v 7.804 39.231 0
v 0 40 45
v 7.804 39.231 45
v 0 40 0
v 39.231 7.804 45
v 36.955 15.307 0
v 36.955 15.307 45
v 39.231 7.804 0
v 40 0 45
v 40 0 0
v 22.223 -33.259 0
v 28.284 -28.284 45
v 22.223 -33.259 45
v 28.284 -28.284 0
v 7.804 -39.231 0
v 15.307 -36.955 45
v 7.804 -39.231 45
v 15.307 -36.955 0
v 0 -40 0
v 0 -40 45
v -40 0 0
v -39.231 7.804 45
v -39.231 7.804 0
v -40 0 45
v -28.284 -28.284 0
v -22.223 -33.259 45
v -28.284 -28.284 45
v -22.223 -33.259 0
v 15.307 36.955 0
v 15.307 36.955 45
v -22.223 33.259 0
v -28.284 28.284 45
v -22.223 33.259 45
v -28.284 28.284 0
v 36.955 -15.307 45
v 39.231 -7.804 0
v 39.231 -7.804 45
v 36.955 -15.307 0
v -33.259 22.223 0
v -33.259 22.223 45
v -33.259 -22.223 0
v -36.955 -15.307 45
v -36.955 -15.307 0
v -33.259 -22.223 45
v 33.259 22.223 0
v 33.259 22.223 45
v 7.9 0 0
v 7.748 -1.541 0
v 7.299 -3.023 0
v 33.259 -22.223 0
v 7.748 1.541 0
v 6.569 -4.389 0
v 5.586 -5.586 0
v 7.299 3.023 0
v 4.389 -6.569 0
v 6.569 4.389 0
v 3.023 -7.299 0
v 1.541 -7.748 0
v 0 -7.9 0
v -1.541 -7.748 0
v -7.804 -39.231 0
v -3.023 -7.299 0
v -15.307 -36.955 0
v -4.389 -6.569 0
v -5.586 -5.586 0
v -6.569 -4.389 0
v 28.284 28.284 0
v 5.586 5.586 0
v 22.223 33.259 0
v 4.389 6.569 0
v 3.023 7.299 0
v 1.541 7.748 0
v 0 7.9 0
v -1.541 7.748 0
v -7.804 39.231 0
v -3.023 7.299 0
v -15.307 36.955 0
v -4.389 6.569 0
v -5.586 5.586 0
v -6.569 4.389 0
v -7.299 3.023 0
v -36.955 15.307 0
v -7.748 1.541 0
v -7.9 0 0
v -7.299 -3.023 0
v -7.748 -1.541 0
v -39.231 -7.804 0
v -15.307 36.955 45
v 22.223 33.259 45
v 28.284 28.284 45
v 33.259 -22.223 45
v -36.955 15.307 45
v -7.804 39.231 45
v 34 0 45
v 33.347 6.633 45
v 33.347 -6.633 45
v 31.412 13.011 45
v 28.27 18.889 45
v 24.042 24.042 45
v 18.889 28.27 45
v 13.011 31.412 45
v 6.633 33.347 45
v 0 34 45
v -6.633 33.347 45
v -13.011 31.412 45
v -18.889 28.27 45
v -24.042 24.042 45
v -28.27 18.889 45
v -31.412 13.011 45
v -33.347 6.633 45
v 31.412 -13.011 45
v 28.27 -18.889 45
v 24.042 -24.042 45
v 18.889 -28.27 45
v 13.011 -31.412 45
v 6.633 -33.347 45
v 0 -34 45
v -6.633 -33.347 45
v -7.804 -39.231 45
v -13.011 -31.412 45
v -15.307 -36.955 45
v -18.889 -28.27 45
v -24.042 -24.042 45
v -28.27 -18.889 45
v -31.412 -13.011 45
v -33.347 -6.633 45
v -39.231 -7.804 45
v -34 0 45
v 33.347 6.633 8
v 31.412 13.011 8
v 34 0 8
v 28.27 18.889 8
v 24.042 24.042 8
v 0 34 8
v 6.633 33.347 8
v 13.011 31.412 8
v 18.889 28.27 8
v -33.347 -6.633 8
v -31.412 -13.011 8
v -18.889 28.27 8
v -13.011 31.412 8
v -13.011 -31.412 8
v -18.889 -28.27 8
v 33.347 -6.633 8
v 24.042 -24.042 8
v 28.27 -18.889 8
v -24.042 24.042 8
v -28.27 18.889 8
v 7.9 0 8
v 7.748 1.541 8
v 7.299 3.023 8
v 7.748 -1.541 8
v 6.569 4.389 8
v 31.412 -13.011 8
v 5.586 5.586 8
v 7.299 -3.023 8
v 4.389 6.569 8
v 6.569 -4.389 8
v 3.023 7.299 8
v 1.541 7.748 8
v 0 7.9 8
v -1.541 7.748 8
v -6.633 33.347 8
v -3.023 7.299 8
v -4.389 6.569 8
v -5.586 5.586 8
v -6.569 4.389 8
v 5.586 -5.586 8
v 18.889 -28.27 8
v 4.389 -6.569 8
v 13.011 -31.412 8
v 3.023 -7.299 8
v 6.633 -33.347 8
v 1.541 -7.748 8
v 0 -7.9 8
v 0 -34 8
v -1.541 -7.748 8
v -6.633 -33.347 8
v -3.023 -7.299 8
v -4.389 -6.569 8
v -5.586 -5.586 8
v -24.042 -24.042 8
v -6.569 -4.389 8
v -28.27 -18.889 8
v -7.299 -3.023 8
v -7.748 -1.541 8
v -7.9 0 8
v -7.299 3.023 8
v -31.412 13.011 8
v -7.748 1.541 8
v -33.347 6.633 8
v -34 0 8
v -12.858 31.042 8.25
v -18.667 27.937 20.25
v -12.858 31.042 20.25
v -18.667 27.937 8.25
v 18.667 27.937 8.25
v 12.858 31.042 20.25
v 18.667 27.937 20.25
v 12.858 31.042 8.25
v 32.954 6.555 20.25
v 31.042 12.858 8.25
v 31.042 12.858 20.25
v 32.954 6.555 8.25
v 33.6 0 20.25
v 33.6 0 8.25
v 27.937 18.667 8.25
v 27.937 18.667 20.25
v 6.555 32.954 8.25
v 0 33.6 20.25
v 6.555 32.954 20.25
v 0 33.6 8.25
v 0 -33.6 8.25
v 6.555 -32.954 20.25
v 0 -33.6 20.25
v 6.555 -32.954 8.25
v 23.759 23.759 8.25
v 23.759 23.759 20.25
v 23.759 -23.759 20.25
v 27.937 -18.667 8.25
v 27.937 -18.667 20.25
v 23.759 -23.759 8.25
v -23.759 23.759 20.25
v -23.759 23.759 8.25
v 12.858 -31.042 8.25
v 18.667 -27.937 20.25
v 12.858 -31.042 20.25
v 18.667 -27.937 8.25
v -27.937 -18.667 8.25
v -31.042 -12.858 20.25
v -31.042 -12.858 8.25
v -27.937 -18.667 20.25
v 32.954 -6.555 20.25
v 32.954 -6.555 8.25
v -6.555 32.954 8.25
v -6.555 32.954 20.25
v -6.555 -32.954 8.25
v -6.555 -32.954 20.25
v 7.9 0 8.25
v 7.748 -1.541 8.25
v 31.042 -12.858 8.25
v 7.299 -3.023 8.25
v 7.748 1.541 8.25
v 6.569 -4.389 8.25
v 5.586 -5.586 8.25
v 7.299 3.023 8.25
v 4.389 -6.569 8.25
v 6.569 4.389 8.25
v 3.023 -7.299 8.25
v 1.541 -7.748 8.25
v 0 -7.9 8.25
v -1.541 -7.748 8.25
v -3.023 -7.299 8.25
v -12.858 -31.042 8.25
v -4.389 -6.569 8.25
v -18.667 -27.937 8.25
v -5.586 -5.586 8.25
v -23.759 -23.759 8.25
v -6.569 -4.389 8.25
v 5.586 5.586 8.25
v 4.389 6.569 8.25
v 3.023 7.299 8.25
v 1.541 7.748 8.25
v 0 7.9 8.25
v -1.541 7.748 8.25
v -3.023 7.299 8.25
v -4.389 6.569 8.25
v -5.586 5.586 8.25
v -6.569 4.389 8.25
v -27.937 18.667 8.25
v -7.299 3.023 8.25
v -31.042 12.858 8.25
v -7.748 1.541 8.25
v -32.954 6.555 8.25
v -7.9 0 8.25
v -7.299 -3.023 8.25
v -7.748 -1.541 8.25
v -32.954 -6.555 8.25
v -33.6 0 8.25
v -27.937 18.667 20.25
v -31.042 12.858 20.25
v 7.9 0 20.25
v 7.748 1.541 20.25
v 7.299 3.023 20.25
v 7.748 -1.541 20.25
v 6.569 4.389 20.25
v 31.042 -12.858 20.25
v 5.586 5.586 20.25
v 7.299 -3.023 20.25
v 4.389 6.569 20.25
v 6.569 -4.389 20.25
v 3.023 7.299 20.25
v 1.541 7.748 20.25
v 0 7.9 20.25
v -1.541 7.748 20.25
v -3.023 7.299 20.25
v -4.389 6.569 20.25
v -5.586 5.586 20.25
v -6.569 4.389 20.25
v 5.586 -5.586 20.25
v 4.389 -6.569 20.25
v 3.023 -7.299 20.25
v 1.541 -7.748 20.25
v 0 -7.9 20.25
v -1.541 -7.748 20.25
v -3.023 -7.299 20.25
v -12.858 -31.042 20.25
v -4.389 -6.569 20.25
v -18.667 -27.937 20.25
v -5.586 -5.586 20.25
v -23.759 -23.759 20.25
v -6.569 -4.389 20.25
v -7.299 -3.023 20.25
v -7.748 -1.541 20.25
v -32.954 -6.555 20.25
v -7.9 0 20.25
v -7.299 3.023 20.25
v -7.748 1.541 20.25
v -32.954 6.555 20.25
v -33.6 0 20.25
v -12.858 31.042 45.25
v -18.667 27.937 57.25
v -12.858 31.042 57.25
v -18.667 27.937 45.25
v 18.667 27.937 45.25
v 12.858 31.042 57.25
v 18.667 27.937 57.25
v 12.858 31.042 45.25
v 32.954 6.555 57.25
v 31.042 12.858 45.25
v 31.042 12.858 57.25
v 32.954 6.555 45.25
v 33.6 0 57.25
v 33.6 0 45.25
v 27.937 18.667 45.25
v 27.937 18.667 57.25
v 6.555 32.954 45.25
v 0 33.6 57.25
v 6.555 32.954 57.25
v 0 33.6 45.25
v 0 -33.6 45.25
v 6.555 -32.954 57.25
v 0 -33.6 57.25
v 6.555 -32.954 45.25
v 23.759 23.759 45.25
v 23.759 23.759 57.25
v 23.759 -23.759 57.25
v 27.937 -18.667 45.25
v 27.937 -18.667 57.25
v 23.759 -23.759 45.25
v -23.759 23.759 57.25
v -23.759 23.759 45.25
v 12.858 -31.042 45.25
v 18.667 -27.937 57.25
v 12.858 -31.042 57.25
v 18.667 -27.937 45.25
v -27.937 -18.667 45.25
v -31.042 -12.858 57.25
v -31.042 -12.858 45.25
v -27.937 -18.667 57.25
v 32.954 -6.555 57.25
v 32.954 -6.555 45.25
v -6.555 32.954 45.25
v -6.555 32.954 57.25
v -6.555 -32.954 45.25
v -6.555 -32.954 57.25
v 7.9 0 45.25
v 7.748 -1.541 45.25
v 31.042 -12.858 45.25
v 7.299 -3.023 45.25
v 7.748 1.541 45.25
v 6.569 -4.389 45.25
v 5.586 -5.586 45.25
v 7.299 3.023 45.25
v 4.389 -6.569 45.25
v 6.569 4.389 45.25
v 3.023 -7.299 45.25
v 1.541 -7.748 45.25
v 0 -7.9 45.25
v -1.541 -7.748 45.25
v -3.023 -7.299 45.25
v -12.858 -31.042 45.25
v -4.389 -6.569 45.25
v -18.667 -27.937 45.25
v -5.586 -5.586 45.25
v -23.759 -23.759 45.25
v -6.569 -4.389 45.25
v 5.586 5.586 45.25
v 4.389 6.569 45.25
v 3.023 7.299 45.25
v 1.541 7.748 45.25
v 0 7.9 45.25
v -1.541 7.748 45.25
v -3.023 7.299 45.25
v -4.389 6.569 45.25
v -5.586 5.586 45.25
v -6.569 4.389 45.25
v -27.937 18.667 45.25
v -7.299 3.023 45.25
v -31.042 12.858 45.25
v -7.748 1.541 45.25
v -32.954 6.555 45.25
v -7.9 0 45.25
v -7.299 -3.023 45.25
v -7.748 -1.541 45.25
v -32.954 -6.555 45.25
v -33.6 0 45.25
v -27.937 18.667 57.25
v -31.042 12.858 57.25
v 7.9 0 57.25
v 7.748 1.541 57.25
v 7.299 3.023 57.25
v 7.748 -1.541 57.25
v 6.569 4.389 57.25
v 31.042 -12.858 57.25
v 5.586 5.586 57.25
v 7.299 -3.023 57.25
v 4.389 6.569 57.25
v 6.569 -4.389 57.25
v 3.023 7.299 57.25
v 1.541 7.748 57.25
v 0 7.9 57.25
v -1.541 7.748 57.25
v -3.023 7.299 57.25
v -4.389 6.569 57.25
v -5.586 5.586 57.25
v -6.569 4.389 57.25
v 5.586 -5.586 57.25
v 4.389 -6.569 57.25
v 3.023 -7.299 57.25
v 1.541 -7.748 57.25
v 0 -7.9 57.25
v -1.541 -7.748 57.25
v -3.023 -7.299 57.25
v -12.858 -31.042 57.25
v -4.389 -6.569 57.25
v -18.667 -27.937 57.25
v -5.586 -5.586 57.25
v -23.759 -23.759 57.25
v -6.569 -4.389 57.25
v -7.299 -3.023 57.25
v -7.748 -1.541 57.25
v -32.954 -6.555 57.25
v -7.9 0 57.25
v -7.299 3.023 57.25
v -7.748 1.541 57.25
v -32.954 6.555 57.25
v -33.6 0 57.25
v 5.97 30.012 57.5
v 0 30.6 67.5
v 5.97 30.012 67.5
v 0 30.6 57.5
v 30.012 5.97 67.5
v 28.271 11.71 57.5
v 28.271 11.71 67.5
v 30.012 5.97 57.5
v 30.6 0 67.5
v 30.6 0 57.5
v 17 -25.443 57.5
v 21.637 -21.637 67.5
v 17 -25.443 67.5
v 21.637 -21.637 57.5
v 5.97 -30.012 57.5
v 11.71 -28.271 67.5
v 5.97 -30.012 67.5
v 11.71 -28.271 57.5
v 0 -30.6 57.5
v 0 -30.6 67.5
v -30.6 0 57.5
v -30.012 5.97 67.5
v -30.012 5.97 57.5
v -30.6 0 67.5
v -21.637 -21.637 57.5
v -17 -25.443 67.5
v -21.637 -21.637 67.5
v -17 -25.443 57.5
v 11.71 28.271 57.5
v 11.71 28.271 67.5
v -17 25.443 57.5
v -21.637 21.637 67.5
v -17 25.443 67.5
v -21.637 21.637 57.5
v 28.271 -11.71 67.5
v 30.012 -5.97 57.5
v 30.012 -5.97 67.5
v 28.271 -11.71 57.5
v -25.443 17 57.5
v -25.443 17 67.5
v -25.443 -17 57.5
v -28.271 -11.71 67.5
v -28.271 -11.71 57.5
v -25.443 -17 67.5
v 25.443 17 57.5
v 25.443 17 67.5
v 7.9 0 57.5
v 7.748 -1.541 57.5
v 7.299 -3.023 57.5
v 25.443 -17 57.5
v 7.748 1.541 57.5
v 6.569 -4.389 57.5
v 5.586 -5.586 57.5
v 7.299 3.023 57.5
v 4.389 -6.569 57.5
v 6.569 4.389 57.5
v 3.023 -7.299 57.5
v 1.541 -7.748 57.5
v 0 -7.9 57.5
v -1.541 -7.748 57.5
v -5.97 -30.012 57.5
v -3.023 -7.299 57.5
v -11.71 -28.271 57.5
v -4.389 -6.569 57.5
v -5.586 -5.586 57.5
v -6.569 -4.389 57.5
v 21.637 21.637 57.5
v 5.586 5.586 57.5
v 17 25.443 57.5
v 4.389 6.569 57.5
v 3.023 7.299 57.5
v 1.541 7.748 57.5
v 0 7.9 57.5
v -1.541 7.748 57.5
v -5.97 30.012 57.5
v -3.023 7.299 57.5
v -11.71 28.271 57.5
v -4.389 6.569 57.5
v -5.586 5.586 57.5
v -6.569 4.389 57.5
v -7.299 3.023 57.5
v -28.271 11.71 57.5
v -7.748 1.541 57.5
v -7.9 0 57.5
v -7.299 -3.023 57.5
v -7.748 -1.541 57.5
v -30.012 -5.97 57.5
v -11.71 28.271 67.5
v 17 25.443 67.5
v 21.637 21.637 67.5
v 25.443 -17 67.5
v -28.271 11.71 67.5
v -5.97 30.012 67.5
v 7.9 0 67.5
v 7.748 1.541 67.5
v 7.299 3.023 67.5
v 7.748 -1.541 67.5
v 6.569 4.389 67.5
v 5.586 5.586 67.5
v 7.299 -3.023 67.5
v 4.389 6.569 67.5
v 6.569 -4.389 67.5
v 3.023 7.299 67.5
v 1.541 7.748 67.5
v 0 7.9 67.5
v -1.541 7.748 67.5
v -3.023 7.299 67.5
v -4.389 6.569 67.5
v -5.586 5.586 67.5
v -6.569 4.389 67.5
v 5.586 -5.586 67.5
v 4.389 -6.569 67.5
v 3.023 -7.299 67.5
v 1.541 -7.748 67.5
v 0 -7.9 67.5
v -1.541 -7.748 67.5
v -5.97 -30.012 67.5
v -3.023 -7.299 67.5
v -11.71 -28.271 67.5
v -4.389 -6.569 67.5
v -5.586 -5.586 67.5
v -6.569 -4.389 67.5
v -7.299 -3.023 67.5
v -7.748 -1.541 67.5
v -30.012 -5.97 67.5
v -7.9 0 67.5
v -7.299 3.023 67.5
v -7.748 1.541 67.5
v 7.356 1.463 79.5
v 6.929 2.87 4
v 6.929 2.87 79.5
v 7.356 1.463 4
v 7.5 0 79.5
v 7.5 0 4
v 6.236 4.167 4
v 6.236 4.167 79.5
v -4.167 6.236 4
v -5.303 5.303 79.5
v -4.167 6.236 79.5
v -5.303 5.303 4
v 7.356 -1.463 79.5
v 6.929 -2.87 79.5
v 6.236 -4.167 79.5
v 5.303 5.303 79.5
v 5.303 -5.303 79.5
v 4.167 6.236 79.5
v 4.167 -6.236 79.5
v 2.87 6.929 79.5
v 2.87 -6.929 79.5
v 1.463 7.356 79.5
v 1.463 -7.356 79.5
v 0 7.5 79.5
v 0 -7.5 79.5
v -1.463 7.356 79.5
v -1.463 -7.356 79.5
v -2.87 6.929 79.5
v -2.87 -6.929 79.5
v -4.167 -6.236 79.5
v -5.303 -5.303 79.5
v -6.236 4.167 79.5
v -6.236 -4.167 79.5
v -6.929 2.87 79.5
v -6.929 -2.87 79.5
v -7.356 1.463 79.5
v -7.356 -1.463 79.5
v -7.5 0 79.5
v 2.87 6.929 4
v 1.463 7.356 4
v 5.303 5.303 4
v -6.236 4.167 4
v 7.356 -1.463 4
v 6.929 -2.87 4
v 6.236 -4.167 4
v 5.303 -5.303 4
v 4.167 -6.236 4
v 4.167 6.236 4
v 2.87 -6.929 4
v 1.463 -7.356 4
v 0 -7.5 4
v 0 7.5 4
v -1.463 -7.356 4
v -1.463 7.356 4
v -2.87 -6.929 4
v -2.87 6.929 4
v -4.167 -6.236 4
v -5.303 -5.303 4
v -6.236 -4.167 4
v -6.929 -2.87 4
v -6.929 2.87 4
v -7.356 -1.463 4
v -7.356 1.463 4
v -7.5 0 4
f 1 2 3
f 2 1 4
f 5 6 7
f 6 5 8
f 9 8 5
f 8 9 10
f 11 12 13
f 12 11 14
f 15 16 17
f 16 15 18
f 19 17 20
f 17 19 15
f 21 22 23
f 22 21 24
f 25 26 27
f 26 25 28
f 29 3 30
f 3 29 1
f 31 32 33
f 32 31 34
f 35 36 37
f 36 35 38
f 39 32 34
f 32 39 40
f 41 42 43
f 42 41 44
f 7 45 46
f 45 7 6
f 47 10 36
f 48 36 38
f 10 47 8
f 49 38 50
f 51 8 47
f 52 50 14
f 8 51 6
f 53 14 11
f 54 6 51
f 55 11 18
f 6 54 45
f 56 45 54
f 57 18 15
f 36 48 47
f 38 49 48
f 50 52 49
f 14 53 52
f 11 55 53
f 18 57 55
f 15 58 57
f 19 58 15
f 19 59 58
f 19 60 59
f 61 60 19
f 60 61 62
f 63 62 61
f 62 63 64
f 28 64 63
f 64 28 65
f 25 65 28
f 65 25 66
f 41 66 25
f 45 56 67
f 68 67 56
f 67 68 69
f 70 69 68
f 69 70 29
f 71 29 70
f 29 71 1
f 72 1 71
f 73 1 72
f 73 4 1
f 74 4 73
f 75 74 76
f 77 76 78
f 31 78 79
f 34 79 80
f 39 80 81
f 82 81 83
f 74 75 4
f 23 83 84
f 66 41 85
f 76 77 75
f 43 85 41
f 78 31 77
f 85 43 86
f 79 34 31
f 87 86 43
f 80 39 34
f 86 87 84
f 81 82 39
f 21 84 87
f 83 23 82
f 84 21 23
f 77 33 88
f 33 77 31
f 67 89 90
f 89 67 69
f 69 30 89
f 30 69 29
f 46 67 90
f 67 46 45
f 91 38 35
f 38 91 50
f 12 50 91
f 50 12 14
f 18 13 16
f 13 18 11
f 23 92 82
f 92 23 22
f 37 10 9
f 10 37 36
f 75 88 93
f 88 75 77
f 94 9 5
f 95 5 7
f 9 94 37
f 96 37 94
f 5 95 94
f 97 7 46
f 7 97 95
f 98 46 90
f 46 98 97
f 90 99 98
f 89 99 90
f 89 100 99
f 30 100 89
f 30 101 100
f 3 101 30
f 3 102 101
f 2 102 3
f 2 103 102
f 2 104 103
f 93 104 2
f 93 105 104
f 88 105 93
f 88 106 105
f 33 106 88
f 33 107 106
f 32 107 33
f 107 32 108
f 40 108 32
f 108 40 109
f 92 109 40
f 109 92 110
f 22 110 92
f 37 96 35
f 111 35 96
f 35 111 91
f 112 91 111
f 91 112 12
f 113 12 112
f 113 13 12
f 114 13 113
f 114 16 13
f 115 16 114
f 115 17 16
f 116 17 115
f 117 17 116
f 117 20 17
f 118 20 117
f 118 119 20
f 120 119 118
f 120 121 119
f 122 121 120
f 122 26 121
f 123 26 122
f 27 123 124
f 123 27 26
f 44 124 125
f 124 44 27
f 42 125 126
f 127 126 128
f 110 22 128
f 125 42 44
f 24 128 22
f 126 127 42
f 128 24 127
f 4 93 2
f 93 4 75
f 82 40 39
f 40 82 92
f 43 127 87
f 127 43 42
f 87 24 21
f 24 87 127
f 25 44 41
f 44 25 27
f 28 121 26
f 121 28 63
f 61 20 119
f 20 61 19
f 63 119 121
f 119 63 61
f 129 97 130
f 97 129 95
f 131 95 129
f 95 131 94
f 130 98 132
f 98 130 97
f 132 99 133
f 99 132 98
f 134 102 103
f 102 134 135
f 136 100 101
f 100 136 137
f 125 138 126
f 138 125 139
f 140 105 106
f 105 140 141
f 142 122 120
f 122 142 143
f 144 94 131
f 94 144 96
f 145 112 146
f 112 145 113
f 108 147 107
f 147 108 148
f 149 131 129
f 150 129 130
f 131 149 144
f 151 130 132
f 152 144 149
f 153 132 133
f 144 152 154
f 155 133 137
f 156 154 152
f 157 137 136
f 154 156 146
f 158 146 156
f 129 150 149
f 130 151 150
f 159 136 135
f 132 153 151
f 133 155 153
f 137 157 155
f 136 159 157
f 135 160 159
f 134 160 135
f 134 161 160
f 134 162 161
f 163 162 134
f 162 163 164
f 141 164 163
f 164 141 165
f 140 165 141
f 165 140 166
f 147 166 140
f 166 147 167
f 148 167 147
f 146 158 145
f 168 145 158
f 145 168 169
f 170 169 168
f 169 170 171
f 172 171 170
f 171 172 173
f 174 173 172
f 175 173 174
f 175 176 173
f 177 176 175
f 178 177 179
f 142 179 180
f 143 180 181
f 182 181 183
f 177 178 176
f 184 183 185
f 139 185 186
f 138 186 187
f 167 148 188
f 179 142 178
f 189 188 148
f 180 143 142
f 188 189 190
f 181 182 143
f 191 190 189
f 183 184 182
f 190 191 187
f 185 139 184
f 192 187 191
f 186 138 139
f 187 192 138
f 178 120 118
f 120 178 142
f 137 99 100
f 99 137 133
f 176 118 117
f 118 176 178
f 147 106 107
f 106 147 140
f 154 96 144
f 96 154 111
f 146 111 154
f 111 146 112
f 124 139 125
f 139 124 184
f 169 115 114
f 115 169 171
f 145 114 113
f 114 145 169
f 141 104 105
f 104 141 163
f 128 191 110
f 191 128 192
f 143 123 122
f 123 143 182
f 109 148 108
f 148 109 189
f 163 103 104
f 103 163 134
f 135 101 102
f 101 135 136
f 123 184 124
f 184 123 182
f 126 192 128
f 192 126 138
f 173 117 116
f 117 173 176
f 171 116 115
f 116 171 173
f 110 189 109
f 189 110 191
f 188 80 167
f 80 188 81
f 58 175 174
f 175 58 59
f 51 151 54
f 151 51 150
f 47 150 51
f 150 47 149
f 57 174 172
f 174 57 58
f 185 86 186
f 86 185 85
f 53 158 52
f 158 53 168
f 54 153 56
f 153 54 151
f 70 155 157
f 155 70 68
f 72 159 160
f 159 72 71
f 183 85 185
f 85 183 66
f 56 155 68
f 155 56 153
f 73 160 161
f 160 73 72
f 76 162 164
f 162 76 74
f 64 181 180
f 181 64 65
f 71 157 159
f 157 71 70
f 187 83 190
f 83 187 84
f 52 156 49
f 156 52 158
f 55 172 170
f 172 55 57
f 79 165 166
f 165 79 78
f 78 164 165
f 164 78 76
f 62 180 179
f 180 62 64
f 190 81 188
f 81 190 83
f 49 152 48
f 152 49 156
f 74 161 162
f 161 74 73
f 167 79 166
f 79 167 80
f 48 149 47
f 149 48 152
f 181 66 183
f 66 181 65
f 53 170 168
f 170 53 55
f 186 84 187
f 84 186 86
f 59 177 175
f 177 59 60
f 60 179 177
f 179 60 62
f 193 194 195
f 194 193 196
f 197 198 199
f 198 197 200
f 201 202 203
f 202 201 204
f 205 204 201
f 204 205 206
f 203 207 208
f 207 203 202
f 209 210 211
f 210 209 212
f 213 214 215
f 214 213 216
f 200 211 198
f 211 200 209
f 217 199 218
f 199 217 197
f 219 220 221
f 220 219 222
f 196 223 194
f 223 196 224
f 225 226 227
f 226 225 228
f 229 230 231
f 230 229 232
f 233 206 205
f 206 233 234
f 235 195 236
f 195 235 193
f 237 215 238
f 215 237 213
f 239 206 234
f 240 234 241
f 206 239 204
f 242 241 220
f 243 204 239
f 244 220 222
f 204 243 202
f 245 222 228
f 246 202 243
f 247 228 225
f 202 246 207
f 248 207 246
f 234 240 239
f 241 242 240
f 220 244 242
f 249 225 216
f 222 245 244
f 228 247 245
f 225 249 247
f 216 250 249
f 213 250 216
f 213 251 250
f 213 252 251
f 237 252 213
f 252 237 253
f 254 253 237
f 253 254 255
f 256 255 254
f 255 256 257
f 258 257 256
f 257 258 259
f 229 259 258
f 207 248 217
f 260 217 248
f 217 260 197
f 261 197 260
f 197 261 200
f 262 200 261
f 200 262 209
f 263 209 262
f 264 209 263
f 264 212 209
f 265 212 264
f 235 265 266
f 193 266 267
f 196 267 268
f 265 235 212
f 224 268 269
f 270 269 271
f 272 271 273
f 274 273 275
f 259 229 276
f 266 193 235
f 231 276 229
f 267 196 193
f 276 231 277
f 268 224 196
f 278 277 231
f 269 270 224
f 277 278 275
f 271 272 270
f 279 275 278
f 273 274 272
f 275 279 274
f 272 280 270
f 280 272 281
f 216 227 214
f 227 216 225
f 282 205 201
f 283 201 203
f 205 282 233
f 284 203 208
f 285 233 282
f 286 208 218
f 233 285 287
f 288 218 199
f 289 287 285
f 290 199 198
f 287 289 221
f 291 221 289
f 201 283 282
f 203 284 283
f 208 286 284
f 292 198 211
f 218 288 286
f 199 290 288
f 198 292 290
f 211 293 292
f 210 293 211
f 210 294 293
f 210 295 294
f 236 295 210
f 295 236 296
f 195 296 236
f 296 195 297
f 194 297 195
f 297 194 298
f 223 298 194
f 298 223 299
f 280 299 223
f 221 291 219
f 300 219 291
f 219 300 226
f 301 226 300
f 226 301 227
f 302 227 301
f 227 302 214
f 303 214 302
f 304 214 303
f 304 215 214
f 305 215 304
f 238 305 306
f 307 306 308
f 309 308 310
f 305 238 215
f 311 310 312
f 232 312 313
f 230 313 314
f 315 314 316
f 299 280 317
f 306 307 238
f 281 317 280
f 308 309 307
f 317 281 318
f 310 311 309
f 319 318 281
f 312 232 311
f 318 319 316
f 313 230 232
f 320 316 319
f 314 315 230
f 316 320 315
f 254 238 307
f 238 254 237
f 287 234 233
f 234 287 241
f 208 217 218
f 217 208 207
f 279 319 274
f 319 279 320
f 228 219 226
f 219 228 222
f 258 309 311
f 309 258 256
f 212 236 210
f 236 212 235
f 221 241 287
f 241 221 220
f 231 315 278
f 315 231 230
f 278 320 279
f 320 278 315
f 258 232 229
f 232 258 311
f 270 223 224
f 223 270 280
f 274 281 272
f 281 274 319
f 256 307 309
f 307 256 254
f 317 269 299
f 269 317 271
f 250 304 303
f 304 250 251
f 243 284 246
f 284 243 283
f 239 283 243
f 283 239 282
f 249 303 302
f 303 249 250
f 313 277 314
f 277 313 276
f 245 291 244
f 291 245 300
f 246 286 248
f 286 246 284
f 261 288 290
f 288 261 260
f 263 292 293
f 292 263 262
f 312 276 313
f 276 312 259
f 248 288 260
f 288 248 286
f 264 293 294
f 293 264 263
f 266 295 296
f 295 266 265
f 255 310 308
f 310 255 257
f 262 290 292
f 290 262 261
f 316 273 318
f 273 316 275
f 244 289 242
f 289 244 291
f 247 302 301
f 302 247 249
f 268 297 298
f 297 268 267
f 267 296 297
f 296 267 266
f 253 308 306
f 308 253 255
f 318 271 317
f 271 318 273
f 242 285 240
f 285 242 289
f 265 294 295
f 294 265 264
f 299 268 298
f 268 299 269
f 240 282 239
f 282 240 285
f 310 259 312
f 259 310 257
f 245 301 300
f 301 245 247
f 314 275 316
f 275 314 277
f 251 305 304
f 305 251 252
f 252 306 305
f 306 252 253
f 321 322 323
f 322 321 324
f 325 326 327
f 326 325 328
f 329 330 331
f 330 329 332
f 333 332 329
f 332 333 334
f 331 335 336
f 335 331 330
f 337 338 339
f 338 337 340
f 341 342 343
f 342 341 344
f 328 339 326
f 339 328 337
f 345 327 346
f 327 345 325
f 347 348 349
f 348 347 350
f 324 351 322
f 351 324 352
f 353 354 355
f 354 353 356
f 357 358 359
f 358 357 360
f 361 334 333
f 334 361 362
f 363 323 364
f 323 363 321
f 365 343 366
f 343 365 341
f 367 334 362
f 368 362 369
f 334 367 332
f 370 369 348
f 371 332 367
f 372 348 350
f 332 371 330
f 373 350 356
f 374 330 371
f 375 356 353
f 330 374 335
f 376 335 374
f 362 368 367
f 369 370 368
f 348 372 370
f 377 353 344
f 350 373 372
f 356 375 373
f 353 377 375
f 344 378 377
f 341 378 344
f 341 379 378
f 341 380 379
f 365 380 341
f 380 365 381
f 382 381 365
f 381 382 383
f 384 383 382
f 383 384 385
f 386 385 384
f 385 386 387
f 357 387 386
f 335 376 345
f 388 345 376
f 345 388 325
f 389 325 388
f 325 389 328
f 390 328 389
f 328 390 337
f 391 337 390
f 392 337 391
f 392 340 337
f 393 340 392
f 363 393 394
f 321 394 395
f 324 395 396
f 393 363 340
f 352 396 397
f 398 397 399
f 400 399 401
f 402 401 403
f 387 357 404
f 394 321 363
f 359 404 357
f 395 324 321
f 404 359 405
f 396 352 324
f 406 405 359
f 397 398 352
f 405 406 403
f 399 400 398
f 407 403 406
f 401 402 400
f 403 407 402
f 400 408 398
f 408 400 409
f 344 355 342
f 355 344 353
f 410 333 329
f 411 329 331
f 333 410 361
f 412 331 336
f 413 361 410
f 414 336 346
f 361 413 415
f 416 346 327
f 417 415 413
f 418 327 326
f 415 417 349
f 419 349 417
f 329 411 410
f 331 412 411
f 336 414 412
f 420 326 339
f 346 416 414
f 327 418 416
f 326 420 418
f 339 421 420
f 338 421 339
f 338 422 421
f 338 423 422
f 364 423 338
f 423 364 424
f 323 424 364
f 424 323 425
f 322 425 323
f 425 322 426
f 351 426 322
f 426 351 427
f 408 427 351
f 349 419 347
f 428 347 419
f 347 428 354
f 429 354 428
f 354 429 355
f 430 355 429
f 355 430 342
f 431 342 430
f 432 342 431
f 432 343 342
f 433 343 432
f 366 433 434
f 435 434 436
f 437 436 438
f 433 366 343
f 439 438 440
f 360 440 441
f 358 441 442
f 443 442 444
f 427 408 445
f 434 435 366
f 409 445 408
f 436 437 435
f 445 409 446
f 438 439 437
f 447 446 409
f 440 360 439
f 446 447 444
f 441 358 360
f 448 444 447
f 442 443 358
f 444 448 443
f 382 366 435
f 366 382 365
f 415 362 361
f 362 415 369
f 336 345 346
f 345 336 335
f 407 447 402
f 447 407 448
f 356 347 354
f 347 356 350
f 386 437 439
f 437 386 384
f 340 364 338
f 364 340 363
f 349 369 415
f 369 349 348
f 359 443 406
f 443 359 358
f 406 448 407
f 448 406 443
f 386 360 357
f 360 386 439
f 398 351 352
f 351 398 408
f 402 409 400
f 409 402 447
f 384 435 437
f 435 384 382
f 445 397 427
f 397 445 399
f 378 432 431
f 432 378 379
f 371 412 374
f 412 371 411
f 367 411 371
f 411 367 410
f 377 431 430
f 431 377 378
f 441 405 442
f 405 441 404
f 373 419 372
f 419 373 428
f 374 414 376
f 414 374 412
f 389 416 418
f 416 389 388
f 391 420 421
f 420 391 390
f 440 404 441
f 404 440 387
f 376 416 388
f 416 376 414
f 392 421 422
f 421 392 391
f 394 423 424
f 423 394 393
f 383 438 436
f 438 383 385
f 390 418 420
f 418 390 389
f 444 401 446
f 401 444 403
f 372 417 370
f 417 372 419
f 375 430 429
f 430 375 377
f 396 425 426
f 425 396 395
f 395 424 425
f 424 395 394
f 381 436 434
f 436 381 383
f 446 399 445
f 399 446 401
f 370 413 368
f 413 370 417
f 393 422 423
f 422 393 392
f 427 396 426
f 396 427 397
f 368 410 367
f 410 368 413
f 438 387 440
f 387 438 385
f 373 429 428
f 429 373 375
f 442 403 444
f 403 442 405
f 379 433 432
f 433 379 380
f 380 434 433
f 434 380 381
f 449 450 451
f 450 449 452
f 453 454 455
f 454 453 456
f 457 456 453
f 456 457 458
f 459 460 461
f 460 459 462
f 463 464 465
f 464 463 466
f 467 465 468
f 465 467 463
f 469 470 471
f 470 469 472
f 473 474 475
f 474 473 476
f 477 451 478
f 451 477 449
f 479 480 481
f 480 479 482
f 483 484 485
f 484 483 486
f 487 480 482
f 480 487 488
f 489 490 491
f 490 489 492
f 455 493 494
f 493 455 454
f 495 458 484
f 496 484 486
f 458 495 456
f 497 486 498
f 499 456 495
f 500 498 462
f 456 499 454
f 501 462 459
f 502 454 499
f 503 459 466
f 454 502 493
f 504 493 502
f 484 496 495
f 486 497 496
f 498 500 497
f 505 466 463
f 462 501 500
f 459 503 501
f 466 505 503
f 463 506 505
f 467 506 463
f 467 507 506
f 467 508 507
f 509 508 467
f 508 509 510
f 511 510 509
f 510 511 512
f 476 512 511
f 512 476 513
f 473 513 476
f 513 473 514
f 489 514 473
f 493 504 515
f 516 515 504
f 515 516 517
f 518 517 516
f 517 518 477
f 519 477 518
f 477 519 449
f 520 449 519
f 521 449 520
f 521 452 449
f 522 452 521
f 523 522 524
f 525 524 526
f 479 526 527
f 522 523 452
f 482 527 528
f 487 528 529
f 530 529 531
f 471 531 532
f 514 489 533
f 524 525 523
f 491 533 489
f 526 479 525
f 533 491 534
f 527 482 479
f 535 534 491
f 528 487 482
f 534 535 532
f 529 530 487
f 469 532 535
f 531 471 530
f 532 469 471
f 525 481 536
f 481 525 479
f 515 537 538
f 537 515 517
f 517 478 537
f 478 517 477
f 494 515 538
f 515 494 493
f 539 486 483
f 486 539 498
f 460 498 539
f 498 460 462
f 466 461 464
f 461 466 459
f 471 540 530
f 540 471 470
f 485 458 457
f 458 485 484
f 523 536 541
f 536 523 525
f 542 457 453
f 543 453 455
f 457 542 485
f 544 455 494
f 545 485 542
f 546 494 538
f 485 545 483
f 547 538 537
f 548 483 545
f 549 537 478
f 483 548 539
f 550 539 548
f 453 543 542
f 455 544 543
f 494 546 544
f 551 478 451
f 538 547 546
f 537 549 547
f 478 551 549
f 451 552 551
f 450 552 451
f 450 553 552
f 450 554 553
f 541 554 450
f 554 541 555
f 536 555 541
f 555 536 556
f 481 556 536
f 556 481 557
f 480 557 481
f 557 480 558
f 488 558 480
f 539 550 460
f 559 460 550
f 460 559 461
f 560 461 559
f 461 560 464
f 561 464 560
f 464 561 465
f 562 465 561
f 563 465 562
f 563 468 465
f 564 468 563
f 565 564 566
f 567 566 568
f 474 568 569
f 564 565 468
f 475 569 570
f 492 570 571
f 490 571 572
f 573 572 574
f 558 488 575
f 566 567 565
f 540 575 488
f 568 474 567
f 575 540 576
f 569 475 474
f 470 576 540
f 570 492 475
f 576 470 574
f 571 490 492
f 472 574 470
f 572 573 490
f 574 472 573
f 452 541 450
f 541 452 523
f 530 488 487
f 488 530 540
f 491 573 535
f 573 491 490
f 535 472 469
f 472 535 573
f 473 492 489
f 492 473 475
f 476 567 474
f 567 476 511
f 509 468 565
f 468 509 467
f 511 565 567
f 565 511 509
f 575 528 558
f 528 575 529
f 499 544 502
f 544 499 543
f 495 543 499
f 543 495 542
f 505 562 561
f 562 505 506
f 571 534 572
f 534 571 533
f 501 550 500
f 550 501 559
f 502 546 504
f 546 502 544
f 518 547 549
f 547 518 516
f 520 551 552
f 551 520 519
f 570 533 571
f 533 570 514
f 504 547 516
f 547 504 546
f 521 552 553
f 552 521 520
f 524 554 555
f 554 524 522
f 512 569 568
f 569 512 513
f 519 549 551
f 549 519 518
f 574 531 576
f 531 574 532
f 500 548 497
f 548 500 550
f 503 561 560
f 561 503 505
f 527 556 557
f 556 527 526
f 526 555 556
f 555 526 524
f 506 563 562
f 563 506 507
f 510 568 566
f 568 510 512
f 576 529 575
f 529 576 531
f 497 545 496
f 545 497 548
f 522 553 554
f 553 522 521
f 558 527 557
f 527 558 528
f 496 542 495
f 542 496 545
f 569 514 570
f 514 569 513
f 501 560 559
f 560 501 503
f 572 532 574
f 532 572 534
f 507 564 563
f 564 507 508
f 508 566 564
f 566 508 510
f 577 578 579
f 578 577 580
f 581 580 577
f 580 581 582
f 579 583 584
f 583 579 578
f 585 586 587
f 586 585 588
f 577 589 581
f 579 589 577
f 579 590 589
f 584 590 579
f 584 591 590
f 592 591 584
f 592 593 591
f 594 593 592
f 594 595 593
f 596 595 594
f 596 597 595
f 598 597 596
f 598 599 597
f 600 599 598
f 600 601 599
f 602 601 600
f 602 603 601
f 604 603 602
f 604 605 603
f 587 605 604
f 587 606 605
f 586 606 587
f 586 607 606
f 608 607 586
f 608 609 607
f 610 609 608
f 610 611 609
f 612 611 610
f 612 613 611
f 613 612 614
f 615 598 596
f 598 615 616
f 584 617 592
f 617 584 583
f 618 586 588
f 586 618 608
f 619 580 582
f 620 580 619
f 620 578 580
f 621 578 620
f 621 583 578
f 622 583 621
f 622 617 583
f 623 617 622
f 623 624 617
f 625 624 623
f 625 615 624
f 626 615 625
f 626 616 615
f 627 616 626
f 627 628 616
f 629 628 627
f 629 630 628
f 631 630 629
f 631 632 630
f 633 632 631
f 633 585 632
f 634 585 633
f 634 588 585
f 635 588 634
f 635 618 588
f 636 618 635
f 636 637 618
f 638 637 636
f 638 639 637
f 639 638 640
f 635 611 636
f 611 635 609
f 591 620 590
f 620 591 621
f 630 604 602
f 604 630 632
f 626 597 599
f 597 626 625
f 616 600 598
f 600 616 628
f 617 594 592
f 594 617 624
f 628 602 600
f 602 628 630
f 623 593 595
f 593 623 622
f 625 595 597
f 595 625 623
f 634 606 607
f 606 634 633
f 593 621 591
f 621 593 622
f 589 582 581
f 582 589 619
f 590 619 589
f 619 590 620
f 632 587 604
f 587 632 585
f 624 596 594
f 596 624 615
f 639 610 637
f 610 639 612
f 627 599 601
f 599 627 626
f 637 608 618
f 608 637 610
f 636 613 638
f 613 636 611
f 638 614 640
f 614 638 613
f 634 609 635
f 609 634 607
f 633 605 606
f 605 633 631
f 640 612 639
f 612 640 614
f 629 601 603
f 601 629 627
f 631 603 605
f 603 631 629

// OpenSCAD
$fn = 32;

// ------------------------------------------------------------------------
// Bearing housing: housing d80, two bearings and a shaft
// Every part is its own module, assembly() places them once.
// ------------------------------------------------------------------------

// --- part 1 ---
module housing() {
  difference() {
    cylinder(h = 45, d = 80);
    translate([0, 0, 8]) cylinder(h = 38, d = 68);
    translate([0, 0, -1]) cylinder(h = 10, d = 15.8);
  }
}

// --- part 2 ---
module bearing_lower() {
  difference() {
      translate([0, 0, 0]) cylinder(h = 12, d = 67.2);
      translate([0, 0, -1]) cylinder(h = 14, d = 15.8);
    }
}

// --- part 3 ---
module bearing_upper() {
  difference() {
      translate([0, 0, 0]) cylinder(h = 12, d = 67.2);
      translate([0, 0, -1]) cylinder(h = 14, d = 15.8);
    }
}

// --- part 4 ---
module spacer() {
  difference() {
      translate([0, 0, 0]) cylinder(h = 10, d = 61.2);
      translate([0, 0, -1]) cylinder(h = 12, d = 15.8);
    }
}

// --- part 5 ---
module shaft() {
  translate([0, 0, -37.75]) cylinder(h = 75.5, d = 15);
}

// --- assembly ---
module assembly() {
  translate([0, 0, 0]) rotate([0, 0, 0]) housing();
  translate([0, 0, 8.25]) rotate([0, 0, 0]) bearing_lower();
  translate([0, 0, 45.25]) rotate([0, 0, 0]) bearing_upper();
  translate([0, 0, 57.5]) rotate([0, 0, 0]) spacer();
  translate([0, 0, 41.75]) rotate([0, 0, 0]) shaft();
}

assembly();
